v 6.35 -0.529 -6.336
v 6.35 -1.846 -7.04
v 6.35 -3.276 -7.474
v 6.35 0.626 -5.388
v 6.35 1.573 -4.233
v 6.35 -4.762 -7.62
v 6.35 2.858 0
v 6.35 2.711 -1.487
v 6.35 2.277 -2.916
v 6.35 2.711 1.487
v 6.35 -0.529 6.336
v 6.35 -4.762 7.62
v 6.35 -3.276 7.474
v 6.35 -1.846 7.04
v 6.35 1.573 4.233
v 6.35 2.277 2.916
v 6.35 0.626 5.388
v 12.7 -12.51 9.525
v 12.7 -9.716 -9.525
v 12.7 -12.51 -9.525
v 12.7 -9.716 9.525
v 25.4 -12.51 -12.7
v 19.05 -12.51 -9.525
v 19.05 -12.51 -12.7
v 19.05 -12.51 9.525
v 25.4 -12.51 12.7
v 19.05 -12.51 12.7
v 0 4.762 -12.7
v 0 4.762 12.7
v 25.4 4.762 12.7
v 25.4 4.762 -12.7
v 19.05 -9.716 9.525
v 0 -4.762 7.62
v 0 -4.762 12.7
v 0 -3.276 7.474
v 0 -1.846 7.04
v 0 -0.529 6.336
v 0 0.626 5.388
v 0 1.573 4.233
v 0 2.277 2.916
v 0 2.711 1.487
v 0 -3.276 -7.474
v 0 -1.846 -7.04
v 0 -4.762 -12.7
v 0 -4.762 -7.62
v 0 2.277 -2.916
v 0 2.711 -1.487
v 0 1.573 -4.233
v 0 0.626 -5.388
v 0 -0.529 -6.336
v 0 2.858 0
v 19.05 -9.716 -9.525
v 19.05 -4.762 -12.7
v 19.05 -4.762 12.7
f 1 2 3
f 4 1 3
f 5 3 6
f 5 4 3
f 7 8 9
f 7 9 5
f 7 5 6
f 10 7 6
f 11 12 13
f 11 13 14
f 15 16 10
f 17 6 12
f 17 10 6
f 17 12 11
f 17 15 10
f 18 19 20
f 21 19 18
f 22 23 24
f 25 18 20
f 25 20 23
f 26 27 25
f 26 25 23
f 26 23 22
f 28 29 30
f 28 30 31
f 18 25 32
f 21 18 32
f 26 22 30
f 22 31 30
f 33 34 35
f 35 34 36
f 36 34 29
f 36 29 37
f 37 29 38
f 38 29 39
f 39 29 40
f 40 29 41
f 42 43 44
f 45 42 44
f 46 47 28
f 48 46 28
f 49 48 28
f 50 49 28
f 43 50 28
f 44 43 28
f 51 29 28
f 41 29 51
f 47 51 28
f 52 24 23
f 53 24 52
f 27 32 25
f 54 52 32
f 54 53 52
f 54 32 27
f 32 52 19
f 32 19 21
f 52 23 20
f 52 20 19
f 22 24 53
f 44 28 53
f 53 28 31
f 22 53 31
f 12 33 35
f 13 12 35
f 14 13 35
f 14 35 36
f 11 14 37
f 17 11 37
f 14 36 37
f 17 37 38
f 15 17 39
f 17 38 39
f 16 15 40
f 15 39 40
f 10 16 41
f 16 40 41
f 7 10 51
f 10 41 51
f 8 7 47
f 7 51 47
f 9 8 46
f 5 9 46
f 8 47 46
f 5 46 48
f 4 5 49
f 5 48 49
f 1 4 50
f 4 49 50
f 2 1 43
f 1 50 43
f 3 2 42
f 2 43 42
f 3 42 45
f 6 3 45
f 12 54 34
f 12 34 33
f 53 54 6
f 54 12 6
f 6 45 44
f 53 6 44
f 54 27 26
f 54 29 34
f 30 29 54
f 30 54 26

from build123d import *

# Parameters (mm, degrees)
SKETCH1_W           = 25.4
SKETCH1_H           = 9.525
BOSS_EXTRUDE1_DEPTH = 25.4
SKETCH2_W           = 6.35
SKETCH2_H           = 25.4
BOSS_EXTRUDE2_DEPTH = 7.747
SKETCH3_W           = 19.05
SKETCH3_H           = 2.794
BOSS_EXTRUDE3_DEPTH = 6.35
CUT_EXTRUDE1_DEPTH  = 6.35


with BuildPart() as part:
    # Sketch1 → Boss-Extrude1 (new body)
    with BuildSketch(Plane(origin=(0, 0, 0), x_dir=(0, 0, -1), z_dir=(1, 0, 0))):
        Rectangle(SKETCH1_W, SKETCH1_H)
    extrude(amount=BOSS_EXTRUDE1_DEPTH)

    # Sketch2 → Boss-Extrude2 (add)
    with BuildSketch(Plane.XZ.offset(4.7625)):
        with Locations((22.225, 0)):
            Rectangle(SKETCH2_W, SKETCH2_H)
    extrude(amount=BOSS_EXTRUDE2_DEPTH)

    # Sketch3 → Boss-Extrude3 (add)
    with BuildSketch(Plane.ZY.offset(-19.05)):
        with Locations((0, -11.1125)):
            Rectangle(SKETCH3_W, SKETCH3_H)
    extrude(amount=BOSS_EXTRUDE3_DEPTH)

    # Sketch4 → Cut-Extrude1 (cut)
    with BuildSketch(Plane.ZY):
        with BuildLine():
            Line((-7.62, -4.7625), (7.62, -4.7625))
            ThreePointArc((7.62, -4.7625), (0, 2.8575), (-7.62, -4.7625))
        make_face()
    extrude(amount=-CUT_EXTRUDE1_DEPTH, mode=Mode.SUBTRACT)


solid = part.part
